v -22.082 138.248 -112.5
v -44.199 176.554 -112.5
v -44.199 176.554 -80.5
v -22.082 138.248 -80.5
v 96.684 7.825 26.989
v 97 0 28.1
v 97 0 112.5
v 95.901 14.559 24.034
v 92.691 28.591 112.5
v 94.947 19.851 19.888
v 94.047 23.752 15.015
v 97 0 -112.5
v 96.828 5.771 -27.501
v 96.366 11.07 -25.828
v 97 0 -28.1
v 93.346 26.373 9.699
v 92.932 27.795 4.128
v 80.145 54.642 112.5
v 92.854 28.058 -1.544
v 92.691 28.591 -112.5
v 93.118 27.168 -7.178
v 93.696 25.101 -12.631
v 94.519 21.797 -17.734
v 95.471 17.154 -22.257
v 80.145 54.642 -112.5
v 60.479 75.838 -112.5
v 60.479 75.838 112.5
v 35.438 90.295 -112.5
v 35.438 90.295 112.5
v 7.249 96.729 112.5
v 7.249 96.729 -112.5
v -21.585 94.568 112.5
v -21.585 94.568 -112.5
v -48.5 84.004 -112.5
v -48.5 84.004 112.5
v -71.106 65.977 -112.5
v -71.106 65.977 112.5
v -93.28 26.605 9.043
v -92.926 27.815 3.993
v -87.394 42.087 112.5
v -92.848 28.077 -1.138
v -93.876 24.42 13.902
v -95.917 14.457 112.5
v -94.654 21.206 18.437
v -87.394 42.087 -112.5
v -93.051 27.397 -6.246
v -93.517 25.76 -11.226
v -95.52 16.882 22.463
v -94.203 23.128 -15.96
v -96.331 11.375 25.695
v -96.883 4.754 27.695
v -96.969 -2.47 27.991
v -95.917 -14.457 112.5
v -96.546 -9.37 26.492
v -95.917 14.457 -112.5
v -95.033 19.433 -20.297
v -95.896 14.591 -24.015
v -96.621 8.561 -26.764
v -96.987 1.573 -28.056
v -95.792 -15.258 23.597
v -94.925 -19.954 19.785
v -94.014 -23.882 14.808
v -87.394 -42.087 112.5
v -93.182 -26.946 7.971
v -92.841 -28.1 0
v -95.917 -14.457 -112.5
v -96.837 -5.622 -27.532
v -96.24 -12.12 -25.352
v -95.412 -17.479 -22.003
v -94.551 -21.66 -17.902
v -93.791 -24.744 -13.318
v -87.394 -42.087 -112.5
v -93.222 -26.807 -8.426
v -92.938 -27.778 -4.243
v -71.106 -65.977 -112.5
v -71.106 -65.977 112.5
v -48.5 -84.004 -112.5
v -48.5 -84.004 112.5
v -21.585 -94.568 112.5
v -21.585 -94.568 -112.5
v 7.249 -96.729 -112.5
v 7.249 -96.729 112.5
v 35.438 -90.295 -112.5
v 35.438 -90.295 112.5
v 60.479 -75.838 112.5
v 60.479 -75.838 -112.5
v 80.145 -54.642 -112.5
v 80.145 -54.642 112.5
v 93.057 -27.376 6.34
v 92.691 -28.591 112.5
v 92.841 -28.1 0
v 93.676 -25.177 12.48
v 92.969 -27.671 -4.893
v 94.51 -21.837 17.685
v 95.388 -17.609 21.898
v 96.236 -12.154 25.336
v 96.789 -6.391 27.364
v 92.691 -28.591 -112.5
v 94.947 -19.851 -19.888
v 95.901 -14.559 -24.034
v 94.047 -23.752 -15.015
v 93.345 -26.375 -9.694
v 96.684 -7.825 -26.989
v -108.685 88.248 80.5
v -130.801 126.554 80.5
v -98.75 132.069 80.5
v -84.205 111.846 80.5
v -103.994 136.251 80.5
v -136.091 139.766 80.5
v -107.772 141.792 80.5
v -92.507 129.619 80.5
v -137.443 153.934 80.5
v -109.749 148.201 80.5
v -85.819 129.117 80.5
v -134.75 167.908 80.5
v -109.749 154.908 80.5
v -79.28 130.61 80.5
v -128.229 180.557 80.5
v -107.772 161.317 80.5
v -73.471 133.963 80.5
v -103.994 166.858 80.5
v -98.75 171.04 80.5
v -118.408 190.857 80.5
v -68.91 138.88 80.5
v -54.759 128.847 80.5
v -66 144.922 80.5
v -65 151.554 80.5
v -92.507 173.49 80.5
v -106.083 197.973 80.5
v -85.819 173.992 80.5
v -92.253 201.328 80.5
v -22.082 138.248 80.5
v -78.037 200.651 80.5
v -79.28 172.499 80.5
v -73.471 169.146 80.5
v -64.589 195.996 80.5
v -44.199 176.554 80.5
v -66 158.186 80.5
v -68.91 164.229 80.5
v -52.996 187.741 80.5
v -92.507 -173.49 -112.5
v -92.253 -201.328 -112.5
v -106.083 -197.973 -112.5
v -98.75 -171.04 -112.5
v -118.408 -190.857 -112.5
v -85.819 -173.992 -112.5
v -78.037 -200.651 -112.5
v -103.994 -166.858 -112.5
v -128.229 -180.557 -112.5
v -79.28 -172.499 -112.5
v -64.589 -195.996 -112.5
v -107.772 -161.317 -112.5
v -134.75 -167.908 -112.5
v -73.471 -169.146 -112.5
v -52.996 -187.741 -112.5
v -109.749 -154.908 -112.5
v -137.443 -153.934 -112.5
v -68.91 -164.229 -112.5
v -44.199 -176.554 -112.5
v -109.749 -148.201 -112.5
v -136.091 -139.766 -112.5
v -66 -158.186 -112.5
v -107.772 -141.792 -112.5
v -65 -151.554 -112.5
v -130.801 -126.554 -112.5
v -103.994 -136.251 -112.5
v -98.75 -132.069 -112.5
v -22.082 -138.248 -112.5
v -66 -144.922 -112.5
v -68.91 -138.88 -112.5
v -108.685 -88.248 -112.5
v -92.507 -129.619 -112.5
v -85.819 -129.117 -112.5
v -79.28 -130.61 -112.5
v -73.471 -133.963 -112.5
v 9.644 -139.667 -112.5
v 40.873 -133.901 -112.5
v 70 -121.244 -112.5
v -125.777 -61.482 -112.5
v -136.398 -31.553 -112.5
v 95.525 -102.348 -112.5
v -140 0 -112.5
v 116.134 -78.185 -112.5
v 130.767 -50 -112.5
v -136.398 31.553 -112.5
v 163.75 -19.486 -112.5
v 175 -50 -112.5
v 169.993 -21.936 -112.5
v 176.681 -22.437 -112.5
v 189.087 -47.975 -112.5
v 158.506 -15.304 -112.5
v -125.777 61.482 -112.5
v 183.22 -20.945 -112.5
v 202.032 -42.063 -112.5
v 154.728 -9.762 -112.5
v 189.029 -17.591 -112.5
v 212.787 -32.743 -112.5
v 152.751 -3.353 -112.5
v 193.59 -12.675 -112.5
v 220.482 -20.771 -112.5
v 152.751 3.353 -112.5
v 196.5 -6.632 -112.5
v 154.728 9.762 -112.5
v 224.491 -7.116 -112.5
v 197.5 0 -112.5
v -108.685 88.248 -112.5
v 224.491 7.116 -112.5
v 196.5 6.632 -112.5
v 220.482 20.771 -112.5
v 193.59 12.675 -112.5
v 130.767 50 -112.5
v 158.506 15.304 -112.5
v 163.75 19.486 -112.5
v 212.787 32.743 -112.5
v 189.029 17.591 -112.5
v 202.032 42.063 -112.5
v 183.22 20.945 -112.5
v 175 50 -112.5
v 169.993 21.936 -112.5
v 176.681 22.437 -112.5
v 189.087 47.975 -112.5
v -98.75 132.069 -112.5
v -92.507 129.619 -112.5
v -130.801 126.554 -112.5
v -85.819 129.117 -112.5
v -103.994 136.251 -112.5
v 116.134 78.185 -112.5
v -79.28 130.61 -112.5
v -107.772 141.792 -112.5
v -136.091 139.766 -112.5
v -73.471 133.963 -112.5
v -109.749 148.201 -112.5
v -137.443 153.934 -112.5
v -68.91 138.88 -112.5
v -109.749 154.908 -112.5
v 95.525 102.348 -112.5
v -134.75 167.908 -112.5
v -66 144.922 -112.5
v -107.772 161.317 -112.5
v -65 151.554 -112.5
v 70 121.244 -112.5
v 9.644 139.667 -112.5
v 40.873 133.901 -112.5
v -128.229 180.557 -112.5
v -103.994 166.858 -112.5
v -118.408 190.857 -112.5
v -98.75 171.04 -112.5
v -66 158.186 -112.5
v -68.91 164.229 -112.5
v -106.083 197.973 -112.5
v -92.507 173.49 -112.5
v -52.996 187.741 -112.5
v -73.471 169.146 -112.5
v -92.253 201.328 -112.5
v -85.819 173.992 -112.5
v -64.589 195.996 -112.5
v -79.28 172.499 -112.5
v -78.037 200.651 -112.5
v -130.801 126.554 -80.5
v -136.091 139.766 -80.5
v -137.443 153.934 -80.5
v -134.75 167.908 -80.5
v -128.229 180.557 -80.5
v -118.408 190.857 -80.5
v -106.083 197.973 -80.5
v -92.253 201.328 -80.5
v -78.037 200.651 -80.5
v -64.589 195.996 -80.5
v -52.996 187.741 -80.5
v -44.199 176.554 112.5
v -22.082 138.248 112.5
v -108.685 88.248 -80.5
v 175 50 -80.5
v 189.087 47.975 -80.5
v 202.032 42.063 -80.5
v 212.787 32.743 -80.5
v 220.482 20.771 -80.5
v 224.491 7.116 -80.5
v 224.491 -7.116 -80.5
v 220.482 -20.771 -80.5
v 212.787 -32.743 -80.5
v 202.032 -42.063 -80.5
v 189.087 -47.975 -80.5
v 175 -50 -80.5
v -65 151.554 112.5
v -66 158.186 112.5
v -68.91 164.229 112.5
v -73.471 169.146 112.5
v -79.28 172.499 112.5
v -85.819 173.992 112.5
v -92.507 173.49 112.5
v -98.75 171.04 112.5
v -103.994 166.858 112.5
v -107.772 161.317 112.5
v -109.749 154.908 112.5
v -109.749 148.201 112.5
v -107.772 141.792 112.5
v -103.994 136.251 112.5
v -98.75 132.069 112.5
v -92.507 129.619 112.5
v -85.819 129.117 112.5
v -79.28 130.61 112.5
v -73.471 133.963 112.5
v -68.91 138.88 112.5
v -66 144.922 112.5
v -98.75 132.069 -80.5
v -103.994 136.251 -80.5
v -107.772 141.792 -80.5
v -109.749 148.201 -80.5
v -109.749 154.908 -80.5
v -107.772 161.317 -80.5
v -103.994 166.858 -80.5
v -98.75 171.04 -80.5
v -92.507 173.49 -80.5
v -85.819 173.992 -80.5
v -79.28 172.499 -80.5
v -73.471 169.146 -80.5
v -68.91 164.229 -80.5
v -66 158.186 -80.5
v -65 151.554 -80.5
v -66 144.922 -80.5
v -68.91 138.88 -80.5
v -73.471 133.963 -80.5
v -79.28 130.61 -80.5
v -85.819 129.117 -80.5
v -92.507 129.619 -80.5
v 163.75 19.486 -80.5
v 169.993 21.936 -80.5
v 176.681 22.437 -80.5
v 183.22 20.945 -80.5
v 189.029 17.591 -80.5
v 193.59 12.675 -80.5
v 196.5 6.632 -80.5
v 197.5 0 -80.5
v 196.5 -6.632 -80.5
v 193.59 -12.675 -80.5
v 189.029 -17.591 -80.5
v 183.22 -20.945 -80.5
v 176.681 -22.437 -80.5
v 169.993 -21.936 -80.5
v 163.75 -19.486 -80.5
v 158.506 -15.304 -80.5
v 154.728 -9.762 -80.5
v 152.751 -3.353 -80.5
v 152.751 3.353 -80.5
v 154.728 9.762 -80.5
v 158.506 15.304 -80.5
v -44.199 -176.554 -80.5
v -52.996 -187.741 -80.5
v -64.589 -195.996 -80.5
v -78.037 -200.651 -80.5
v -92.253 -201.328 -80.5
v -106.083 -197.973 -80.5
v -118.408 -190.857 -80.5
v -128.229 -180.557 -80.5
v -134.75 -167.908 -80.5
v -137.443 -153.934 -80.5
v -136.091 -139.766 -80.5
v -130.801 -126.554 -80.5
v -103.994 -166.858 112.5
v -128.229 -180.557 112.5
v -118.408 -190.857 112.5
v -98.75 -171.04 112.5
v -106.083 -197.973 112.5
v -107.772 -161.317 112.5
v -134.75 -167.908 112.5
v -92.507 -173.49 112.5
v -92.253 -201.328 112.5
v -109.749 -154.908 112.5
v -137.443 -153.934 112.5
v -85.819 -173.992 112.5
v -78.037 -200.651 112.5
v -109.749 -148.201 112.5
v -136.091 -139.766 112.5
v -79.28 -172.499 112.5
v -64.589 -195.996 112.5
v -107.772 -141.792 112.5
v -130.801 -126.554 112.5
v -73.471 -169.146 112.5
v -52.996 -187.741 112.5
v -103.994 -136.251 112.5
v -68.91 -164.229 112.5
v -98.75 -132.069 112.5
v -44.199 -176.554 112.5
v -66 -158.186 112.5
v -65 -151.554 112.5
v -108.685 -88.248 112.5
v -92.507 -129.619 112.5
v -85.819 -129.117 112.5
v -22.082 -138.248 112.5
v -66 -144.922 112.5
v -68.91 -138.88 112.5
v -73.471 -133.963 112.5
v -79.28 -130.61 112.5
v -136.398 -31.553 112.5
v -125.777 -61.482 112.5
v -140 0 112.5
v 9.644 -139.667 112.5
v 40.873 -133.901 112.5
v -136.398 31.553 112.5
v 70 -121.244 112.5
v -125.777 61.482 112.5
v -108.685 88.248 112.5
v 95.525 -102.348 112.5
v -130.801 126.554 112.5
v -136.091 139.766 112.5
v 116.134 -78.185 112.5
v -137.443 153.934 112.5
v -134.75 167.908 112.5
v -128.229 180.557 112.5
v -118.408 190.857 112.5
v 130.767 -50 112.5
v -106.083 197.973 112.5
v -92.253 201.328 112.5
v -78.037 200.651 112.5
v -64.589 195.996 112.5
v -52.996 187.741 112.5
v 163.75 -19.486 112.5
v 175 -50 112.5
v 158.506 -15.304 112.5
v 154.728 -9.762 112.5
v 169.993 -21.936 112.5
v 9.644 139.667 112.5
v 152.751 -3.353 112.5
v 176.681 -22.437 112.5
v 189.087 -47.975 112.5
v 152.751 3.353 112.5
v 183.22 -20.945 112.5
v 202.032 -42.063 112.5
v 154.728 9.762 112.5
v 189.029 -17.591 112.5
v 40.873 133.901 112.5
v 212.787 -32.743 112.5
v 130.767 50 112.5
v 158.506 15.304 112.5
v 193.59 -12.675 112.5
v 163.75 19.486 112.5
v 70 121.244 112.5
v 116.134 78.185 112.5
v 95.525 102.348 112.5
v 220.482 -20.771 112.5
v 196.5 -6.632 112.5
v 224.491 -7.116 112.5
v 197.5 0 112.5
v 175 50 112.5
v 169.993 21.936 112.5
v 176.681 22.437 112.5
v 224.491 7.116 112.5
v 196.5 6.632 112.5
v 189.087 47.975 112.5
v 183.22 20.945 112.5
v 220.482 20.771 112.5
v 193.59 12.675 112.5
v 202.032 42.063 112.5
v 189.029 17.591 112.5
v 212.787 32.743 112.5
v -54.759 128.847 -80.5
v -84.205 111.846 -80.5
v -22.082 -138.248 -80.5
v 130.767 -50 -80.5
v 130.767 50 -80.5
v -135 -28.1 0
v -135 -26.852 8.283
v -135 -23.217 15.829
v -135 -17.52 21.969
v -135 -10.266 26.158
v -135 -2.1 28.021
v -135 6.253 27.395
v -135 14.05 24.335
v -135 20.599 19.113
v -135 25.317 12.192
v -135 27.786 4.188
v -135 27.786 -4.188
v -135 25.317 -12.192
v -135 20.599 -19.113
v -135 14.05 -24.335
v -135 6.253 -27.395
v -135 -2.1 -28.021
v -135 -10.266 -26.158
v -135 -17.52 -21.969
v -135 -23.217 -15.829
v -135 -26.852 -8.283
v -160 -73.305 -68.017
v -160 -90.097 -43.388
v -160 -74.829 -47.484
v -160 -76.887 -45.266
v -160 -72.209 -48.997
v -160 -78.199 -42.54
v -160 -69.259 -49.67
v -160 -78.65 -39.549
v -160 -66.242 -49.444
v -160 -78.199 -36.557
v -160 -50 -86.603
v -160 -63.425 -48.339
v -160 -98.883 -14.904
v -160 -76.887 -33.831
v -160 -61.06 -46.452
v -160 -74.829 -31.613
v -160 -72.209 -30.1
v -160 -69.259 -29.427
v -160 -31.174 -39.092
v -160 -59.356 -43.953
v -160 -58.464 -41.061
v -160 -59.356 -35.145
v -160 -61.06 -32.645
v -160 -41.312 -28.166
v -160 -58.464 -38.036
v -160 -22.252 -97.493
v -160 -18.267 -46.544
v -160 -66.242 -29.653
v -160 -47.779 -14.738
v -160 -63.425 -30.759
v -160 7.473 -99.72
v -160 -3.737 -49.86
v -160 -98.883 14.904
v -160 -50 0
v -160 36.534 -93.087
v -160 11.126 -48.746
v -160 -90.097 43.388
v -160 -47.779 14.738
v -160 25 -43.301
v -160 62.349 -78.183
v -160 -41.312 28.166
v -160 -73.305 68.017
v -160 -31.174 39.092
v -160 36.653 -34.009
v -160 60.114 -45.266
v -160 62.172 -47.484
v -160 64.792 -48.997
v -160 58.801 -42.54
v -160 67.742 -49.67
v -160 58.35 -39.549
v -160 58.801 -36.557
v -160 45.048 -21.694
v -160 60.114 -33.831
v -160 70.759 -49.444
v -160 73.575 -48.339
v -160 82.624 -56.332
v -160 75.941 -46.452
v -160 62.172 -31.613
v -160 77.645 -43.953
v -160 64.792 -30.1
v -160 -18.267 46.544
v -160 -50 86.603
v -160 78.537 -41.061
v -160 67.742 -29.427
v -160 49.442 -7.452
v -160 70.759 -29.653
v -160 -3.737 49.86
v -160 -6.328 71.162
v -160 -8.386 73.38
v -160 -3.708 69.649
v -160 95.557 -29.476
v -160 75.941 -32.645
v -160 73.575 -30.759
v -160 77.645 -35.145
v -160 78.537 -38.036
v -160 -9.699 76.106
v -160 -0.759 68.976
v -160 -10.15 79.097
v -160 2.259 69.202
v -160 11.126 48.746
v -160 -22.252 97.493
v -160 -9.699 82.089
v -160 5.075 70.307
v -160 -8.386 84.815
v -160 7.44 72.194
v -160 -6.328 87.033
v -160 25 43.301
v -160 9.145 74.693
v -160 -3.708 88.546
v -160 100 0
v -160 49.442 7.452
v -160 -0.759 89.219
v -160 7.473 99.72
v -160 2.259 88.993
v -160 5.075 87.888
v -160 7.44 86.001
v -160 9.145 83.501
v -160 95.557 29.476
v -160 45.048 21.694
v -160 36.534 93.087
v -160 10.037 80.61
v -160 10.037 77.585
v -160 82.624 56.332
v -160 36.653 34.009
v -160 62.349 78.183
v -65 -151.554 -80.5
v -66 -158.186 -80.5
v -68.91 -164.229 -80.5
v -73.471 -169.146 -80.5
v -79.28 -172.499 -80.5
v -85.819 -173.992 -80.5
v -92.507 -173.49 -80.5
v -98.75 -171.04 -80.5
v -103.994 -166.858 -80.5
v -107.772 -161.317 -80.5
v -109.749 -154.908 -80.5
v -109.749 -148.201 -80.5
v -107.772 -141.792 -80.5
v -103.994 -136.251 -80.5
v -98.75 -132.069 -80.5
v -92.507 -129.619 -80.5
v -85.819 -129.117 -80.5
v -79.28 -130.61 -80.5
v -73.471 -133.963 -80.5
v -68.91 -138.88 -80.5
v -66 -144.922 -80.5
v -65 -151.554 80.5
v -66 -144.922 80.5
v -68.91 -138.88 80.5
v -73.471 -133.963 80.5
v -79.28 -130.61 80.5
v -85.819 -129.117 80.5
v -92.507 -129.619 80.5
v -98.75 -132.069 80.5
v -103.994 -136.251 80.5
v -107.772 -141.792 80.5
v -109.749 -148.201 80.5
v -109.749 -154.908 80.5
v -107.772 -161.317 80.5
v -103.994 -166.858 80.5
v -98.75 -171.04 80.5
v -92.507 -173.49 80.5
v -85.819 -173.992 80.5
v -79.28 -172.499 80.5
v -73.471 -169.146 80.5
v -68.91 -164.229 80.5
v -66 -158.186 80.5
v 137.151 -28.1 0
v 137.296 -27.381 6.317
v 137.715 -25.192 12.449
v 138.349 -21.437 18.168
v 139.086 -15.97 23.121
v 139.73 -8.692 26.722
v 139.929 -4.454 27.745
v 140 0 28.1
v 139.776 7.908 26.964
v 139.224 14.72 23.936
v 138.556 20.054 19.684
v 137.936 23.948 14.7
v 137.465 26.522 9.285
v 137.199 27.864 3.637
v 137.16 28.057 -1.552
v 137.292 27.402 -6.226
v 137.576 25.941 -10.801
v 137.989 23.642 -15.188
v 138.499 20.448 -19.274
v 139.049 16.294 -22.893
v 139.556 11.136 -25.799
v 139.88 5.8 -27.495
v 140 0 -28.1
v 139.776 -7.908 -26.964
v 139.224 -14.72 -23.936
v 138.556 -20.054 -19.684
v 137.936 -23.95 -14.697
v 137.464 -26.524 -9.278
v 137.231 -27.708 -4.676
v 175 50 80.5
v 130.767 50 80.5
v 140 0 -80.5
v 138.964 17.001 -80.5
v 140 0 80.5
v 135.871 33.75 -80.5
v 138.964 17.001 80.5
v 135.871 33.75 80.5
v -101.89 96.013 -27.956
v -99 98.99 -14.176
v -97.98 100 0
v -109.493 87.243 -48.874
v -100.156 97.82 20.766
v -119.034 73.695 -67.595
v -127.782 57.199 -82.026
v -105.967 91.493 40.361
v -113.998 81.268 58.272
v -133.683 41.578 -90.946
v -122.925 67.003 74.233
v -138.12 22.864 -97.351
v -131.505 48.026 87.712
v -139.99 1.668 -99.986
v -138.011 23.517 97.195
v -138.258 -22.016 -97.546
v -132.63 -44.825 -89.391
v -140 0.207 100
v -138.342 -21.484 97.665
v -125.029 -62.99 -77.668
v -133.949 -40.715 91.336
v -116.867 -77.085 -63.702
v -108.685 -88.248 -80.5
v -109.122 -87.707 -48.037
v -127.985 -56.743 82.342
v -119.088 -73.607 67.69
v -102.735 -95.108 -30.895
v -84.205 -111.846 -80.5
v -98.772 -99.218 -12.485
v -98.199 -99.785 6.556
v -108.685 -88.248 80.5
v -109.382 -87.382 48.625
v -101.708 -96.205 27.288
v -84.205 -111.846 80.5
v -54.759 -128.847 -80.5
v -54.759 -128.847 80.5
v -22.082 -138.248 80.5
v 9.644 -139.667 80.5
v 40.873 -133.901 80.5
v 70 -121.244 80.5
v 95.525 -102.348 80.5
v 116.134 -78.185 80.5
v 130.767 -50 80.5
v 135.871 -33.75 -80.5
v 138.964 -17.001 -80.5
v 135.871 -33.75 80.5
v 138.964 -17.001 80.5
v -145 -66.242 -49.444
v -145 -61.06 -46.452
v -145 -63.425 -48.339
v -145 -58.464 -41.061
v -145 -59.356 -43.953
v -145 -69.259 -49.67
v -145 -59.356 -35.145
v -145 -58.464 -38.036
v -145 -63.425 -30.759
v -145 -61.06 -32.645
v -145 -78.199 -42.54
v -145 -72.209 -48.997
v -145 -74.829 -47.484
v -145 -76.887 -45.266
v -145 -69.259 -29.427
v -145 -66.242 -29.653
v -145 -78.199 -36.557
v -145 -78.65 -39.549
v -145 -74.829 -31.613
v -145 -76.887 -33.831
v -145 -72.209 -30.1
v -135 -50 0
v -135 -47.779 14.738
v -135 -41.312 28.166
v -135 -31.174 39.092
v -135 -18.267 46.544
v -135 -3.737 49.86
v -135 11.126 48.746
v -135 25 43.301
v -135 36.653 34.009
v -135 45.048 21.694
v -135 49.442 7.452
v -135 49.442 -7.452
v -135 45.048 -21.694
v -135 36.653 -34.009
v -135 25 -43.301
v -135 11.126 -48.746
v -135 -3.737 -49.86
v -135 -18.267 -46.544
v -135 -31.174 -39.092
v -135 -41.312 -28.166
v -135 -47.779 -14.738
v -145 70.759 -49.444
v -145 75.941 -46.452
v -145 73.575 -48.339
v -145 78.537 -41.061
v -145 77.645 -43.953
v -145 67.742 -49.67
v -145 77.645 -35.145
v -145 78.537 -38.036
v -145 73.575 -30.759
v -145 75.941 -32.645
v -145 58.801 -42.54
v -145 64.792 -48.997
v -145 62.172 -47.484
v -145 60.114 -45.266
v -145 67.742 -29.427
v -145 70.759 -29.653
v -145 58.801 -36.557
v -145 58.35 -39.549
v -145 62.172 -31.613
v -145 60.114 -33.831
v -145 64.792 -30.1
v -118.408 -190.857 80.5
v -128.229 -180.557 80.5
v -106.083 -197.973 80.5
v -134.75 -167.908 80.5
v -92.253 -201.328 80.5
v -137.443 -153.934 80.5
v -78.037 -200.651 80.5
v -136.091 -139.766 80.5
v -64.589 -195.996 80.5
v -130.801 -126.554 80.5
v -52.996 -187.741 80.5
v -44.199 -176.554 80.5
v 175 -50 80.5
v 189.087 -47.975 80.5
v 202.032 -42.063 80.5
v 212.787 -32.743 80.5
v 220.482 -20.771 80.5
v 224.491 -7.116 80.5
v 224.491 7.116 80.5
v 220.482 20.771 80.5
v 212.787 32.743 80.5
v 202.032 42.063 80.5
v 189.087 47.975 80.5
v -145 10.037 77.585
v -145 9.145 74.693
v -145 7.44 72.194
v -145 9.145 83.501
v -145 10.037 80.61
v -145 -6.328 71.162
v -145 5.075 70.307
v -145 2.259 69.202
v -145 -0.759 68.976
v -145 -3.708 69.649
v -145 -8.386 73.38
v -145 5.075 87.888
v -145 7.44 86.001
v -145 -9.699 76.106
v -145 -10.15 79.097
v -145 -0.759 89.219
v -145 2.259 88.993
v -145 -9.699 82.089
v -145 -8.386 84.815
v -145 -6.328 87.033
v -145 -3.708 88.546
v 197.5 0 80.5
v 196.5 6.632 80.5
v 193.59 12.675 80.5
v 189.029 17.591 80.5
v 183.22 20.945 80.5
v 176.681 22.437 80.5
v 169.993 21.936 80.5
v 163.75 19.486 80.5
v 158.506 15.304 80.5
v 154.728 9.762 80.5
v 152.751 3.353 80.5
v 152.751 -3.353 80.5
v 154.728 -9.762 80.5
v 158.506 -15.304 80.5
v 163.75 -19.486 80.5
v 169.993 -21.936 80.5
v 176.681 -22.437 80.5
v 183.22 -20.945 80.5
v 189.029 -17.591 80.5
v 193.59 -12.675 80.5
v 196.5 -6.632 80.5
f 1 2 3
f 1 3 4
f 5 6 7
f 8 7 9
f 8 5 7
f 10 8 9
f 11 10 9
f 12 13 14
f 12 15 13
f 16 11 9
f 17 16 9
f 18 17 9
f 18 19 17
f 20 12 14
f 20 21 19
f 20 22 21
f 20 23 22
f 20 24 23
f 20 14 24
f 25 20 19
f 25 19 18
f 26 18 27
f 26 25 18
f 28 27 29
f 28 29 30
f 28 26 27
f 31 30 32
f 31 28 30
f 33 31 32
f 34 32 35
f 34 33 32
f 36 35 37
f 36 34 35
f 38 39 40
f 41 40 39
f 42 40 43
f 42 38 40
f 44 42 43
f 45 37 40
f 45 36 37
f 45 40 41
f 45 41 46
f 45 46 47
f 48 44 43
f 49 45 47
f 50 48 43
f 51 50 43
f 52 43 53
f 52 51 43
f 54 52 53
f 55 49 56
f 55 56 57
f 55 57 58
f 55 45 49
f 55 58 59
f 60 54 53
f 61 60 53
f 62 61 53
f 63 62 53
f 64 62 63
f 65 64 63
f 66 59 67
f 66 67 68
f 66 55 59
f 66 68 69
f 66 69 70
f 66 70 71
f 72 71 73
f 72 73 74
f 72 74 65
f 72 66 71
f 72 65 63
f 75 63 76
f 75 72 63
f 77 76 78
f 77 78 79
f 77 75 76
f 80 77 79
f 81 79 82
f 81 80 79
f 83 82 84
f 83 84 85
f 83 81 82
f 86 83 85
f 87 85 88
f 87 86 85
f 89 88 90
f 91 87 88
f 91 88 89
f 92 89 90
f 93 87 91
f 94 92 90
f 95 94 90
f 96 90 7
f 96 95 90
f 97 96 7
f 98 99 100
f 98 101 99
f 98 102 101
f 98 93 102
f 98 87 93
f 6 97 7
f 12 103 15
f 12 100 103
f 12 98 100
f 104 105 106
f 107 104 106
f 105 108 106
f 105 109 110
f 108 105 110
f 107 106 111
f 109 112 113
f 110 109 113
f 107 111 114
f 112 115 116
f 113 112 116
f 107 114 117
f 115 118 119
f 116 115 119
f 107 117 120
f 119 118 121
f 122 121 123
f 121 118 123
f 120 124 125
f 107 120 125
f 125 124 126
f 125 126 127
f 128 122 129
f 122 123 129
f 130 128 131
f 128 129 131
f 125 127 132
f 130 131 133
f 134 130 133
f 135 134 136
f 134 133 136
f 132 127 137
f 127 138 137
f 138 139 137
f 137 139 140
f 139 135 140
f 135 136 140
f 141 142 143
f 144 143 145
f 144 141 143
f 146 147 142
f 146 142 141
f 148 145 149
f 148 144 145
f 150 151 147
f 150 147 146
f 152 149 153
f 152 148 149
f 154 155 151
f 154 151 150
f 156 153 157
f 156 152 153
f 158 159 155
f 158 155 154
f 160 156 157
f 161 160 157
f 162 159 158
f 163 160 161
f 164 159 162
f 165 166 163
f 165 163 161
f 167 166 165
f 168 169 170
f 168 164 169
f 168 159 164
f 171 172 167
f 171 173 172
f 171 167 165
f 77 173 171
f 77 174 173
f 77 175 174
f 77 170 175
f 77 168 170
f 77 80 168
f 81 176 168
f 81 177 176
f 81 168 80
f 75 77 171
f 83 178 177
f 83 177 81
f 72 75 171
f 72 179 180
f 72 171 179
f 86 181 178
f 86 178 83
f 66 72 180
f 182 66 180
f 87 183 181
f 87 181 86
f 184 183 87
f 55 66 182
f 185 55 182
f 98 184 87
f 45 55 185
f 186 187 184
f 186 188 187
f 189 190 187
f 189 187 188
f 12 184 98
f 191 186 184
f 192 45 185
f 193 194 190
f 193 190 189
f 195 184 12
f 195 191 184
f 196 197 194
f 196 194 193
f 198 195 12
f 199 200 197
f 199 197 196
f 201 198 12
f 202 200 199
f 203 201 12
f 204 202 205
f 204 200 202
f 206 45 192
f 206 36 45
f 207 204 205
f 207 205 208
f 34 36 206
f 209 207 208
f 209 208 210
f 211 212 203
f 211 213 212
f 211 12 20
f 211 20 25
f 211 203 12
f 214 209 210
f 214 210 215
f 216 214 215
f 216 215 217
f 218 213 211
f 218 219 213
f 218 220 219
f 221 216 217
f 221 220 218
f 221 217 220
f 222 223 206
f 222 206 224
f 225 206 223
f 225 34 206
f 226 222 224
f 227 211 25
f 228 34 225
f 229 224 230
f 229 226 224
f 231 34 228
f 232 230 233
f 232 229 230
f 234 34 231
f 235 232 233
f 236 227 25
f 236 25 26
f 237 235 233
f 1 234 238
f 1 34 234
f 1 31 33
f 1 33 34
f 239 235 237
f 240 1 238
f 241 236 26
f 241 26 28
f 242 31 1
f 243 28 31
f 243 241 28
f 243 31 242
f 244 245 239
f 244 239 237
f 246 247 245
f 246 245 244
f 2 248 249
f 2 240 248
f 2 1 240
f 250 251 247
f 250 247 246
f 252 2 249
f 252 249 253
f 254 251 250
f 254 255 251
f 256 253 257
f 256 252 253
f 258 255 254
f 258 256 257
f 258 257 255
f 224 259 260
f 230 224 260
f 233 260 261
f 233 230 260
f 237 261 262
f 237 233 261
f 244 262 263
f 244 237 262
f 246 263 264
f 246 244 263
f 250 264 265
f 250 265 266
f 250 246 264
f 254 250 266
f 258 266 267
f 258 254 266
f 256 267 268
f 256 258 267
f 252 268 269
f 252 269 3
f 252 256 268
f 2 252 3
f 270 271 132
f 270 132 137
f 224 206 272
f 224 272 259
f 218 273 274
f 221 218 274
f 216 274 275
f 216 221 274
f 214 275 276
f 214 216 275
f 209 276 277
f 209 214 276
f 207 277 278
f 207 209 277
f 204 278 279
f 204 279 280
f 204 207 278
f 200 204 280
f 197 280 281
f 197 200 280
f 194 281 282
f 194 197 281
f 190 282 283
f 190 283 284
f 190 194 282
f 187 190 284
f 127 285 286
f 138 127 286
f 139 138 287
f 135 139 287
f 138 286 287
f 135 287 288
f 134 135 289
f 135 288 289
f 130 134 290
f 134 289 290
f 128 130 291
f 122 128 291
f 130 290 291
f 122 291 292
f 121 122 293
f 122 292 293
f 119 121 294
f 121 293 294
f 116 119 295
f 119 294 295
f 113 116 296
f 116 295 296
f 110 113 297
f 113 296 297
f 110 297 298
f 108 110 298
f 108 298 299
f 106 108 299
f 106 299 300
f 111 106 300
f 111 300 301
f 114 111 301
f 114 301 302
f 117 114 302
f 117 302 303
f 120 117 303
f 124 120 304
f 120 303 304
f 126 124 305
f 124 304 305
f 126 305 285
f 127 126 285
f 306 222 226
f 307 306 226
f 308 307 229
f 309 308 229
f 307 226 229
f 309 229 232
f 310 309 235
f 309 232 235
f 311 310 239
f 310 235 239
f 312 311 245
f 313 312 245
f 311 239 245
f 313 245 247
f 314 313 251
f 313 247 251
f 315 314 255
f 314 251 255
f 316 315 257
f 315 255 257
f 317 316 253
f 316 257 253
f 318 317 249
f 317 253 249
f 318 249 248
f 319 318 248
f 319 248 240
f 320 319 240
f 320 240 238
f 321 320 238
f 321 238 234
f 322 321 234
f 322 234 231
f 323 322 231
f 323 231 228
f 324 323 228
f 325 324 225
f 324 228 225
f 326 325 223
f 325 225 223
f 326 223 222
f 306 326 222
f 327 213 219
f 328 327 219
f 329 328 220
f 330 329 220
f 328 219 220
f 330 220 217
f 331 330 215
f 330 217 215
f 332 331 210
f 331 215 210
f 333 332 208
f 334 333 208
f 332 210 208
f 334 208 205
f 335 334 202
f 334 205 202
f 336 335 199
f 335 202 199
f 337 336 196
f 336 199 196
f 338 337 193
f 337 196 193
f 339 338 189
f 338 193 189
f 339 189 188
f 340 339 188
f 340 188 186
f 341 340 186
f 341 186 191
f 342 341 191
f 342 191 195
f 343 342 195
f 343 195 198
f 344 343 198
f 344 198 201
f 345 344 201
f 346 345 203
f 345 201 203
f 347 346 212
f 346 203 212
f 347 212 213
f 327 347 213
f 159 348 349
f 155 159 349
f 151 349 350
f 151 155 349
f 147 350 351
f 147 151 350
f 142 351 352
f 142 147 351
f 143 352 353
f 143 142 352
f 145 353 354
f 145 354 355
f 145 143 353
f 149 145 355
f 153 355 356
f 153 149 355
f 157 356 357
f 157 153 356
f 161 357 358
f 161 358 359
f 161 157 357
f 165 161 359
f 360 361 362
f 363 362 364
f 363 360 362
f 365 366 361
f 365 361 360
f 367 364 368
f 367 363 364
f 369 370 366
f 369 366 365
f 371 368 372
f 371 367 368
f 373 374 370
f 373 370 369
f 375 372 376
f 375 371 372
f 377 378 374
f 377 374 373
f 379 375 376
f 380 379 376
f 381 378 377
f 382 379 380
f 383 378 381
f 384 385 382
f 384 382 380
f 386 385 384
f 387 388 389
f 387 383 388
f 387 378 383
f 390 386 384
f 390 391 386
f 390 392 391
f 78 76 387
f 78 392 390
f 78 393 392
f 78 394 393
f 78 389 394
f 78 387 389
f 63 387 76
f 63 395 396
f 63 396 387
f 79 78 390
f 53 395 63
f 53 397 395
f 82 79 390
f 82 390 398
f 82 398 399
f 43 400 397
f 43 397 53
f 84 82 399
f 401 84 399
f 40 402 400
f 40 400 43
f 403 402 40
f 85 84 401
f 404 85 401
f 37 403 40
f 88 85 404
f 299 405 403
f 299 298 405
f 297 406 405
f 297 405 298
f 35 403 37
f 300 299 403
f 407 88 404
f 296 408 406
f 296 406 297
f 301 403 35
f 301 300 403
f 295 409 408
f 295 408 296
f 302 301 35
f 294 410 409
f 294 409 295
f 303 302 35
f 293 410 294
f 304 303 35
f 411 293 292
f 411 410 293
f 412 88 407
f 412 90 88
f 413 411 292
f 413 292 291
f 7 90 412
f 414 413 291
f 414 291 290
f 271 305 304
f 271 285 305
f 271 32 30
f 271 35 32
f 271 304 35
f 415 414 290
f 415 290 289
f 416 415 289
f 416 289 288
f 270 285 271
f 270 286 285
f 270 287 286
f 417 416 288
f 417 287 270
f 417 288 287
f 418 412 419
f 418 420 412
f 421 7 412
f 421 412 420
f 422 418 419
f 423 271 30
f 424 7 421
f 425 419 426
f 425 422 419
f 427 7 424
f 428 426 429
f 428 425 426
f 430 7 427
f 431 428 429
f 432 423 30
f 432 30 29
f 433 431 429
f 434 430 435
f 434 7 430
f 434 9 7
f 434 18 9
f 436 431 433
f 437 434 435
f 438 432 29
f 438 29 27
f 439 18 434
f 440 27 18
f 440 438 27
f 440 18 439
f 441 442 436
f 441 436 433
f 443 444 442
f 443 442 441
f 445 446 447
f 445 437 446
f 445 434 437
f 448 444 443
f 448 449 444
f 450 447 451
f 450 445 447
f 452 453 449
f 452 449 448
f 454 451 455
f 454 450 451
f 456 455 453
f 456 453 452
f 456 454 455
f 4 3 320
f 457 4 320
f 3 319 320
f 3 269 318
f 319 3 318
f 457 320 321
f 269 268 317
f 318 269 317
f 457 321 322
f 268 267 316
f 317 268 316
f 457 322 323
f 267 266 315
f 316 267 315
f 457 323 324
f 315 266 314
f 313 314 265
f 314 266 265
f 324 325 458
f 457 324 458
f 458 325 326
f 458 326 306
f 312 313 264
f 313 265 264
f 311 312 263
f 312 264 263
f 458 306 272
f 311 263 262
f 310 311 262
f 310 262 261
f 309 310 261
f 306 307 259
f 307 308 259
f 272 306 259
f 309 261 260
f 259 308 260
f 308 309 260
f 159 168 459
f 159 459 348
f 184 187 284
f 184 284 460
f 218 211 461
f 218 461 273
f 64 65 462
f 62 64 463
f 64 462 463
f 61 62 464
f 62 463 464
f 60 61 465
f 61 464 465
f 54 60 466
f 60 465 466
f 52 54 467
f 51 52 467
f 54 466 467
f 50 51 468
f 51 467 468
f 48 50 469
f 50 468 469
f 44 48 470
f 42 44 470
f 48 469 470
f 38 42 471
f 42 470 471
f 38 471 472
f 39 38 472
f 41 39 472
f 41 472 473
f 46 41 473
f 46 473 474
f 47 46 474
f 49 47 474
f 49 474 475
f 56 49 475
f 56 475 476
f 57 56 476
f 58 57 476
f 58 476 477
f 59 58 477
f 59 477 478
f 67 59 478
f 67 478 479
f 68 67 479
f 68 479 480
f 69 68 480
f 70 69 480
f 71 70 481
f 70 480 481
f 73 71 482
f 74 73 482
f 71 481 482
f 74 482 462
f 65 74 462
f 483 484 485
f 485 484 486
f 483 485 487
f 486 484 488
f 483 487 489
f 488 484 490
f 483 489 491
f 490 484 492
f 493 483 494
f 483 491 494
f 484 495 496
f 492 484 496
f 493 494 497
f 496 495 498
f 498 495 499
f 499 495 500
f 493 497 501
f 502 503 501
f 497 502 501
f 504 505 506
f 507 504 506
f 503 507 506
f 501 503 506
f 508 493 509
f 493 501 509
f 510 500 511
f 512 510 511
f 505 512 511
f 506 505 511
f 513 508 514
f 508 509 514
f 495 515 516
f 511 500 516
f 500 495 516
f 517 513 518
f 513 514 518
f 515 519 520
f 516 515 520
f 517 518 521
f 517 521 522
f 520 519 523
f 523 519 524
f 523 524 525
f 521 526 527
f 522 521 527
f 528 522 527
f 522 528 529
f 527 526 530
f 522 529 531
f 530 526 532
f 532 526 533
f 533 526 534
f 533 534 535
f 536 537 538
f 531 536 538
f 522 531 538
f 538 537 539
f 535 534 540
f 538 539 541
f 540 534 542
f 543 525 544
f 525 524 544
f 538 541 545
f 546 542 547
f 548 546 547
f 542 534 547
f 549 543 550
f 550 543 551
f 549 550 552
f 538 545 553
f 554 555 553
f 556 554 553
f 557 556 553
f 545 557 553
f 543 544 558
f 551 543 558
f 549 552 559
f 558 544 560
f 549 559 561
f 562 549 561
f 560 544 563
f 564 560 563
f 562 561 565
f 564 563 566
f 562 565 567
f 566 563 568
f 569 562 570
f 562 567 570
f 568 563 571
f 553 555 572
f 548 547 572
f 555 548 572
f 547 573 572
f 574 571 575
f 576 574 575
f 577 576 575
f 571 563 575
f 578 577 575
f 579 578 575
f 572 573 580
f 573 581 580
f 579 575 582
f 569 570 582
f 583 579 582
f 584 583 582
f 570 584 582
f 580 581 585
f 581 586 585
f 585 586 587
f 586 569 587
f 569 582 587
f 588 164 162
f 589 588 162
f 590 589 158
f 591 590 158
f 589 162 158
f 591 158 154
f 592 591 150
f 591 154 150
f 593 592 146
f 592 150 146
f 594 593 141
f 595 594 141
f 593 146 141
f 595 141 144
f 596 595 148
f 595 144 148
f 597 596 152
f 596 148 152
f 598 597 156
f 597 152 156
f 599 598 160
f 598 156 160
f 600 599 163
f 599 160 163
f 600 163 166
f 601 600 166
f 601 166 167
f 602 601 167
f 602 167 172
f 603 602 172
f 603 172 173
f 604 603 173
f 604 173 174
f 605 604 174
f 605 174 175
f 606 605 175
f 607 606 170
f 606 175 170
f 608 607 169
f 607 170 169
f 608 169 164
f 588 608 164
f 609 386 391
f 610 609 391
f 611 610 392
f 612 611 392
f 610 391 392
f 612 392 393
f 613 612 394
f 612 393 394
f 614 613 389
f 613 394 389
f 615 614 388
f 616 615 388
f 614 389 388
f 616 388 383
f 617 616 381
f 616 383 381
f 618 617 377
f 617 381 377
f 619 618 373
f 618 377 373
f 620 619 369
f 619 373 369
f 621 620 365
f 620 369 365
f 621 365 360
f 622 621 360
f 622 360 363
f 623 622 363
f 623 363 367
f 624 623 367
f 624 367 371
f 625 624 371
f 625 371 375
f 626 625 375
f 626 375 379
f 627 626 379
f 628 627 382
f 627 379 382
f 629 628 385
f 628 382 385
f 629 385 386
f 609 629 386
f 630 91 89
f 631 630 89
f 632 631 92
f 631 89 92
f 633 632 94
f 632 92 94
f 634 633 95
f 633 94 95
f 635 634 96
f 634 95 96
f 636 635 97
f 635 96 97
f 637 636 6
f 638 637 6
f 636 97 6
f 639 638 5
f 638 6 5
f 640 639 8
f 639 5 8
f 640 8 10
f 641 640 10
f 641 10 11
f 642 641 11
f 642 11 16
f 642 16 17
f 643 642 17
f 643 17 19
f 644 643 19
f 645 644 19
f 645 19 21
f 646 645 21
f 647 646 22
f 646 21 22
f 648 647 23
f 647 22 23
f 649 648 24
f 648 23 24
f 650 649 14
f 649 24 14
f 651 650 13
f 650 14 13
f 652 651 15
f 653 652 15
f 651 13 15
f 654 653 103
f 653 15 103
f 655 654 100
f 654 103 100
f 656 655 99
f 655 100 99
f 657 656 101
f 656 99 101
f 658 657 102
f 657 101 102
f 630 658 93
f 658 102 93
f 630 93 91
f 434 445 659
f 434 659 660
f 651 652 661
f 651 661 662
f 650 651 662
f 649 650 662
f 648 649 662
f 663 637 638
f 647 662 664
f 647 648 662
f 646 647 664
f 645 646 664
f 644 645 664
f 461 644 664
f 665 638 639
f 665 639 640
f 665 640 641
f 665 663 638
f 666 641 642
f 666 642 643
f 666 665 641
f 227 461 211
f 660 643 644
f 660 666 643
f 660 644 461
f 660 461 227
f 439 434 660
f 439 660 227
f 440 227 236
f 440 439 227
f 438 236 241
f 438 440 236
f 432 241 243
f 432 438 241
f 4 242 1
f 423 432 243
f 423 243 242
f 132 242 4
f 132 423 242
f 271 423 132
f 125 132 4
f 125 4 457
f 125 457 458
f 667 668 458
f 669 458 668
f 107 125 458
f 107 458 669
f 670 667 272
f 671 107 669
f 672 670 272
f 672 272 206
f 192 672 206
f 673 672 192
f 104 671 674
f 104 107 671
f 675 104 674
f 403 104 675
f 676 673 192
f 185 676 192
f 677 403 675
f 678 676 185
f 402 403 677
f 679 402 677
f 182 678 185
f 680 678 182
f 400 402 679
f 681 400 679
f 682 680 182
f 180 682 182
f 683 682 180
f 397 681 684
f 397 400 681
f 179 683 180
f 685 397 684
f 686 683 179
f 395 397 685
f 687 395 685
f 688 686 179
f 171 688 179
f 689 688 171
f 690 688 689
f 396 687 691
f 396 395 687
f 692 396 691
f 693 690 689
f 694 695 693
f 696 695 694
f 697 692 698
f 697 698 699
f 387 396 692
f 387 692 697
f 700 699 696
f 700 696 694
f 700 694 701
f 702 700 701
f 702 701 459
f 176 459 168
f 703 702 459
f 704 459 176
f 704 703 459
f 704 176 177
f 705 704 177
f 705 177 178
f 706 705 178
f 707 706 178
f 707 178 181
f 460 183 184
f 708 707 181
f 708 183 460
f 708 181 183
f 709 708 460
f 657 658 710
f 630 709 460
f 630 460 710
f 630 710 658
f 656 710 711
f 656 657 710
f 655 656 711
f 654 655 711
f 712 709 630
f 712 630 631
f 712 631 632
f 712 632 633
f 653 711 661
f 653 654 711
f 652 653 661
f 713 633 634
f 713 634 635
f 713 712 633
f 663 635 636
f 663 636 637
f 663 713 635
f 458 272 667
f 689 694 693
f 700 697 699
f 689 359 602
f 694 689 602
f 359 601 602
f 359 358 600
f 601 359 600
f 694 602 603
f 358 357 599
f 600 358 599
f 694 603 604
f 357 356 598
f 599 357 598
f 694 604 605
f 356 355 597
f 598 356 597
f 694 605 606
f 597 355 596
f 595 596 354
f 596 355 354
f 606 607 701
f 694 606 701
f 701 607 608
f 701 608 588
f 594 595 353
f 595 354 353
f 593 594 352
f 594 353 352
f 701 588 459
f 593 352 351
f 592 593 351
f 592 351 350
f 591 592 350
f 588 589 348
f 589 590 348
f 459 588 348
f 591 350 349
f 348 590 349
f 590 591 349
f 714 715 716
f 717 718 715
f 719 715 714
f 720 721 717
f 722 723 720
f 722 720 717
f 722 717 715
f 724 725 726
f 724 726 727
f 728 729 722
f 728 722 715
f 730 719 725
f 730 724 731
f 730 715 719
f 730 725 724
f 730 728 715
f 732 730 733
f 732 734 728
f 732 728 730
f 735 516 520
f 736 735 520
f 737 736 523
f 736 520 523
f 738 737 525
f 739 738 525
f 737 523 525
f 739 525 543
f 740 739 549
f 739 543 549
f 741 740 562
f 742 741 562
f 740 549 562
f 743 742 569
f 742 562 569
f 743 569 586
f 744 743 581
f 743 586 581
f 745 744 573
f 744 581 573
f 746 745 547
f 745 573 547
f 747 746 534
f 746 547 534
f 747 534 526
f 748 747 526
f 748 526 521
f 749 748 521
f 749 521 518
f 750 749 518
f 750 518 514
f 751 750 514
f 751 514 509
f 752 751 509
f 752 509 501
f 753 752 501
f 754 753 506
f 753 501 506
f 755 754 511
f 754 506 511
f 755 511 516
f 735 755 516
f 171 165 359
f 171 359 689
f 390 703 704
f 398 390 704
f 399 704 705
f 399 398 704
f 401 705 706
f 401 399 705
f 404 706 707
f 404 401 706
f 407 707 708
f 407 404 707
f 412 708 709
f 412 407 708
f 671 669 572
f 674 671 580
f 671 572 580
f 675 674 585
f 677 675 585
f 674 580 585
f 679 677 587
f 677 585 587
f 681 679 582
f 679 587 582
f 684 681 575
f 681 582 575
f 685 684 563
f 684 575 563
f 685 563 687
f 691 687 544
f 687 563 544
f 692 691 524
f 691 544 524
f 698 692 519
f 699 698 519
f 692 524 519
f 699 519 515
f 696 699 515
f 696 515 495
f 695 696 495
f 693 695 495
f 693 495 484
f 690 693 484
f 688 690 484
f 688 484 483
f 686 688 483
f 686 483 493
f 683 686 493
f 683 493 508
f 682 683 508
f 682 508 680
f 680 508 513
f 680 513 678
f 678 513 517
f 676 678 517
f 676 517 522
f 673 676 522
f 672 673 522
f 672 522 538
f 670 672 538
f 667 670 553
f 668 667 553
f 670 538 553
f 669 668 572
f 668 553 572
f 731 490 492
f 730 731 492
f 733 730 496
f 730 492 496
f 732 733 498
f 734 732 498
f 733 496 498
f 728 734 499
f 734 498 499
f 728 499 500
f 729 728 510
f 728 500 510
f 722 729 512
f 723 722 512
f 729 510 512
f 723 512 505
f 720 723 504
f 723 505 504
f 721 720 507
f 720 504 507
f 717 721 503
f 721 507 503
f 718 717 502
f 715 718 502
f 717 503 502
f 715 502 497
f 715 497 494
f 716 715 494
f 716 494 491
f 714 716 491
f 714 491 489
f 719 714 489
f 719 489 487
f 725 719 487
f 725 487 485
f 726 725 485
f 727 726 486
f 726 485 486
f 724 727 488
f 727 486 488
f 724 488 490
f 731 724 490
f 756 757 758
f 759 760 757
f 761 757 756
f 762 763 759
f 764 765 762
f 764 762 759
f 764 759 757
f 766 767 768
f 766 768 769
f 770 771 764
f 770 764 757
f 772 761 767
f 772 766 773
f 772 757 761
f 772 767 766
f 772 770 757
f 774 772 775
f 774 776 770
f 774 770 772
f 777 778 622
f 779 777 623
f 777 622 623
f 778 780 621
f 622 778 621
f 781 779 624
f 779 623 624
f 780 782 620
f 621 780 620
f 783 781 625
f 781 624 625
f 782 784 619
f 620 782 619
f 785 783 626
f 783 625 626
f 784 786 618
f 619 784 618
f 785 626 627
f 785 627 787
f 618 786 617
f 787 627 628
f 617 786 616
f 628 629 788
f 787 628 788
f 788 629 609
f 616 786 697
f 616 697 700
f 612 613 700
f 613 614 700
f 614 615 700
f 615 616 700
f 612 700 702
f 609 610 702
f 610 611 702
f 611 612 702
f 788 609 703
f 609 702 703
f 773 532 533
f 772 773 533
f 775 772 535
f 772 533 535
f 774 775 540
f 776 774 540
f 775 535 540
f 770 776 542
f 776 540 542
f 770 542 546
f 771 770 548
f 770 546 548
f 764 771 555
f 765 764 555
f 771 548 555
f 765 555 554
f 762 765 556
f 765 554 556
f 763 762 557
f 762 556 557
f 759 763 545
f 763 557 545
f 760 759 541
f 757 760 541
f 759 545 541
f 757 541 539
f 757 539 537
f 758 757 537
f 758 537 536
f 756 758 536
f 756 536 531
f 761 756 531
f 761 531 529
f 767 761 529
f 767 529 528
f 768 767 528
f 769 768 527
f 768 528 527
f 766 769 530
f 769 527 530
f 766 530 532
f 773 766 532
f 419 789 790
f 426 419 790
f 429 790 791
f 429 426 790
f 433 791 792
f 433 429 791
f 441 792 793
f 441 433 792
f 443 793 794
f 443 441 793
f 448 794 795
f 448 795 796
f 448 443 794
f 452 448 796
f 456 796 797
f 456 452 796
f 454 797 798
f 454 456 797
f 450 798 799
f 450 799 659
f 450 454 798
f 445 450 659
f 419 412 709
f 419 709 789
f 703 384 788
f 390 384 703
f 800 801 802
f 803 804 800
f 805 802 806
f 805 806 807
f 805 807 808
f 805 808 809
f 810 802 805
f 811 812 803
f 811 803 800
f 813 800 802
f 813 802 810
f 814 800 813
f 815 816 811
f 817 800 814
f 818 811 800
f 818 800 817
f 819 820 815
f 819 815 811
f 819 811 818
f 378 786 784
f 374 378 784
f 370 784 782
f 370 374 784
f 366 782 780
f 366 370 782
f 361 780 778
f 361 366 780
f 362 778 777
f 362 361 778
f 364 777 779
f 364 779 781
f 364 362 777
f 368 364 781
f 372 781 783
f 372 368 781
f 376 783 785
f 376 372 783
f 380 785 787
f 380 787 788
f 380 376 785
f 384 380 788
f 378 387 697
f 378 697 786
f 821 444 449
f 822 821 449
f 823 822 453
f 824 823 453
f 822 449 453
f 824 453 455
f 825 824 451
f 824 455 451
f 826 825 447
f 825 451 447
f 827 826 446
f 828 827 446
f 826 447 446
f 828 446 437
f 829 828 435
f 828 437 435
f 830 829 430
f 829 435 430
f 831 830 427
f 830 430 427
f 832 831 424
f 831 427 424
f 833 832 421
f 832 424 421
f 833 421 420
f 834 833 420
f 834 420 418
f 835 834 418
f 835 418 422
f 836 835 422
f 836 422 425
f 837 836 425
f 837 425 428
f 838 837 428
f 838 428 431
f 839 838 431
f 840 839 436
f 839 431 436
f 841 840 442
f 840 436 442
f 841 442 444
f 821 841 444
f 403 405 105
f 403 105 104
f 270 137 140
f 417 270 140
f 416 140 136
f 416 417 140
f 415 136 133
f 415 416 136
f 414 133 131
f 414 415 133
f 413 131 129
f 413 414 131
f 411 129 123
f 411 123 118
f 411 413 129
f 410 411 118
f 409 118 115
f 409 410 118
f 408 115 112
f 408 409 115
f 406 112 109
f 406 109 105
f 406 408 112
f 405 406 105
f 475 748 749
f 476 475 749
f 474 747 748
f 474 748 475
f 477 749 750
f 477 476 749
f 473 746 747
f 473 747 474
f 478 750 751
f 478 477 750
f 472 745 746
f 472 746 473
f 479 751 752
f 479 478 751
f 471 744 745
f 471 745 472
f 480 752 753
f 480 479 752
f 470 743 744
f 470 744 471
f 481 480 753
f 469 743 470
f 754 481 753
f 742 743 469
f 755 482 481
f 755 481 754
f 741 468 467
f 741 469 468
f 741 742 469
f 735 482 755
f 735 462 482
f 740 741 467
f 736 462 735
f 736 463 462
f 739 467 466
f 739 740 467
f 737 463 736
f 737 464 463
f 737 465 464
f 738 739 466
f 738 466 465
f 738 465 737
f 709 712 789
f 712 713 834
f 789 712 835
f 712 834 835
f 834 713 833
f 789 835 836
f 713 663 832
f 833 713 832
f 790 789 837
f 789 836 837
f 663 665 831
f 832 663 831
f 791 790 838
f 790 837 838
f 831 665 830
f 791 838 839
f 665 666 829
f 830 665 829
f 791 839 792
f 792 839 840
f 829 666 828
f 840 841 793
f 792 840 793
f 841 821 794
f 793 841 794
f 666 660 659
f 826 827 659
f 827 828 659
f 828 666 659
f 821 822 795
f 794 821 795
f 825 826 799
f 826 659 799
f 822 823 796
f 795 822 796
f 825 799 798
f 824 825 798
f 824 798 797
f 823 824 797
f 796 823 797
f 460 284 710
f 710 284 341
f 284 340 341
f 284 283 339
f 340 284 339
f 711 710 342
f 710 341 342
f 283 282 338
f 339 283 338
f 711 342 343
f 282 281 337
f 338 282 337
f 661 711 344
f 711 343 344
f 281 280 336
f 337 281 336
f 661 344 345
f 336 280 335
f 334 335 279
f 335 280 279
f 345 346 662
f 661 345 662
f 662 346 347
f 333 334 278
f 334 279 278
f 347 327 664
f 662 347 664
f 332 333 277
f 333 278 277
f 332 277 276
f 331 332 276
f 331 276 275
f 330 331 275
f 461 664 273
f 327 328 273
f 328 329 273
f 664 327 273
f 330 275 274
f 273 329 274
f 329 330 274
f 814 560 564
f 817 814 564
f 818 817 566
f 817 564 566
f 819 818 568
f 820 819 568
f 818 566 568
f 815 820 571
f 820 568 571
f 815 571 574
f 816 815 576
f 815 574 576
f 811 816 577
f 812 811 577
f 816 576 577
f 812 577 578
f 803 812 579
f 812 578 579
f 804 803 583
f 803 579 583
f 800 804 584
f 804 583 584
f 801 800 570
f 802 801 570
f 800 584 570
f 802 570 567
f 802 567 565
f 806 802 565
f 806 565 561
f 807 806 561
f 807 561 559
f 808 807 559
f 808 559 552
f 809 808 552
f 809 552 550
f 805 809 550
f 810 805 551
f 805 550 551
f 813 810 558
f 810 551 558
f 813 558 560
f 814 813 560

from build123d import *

# Parameters (mm, degrees)
F0_R            = 140
F0_R_2          = 97
F1_DEPTH        = 112.5
F2_R            = 22.5
F3_DEPTH        = 32
F3_COPIES_COUNT = 3
F5_R            = 100
F7_R            = 28.1
F8_DEPTH        = 310
F9_R            = 50
F9_R_2          = 28.1
F10_DEPTH       = 25
F11_R           = 10.15
F12_DEPTH       = 15
F14_R           = 22.5
F14_R_2         = 97
F15_DEPTH       = 32


# Not quite as in the source:
# - a pattern or mirror of a feature is missing from the dataset's text; its kind, count and spacing are read off the source's solid
# - a feature names something its author has since deleted; it is built from what else it names


with BuildPart() as f1:
    # F0 (on Top) → F1 (new body, symmetric)
    with BuildSketch(Plane.XY):
        Circle(F0_R)
        Circle(F0_R_2, mode=Mode.SUBTRACT)
    extrude(amount=F1_DEPTH, both=True)

    # F2 (on face) → F3 (join)
    with BuildSketch(Plane(origin=(0, 0, -112.5), x_dir=(1, 0, 0), z_dir=(0, 0, -1))):
        with BuildLine():
            ThreePointArc((-44.1987298108, 176.5544456623), (-112.5, 194.8557158515), (-130.8012701892, 126.5544456623))
            Line((-130.8012701892, 126.5544456623), (-108.6847543423, 88.2475165291))
            ThreePointArc((-108.6847543423, 88.2475165291), (-70, 121.2435565298), (-22.0822139639, 138.2475165291))
            Line((-22.0822139639, 138.2475165291), (-44.1987298108, 176.5544456623))
        make_face()
        with Locations((-87.5, 151.5544456623)):
            Circle(F2_R, mode=Mode.SUBTRACT)
    f3 = extrude(amount=-F3_DEPTH)

    # F3_copies: F3 ×3 about axis
    f3_copies_axis = Axis((0, 0, 0), (0, 0, 1))
    for i in range(1, F3_COPIES_COUNT):
        add(f3.rotate(f3_copies_axis, i * 360 / F3_COPIES_COUNT))

    # F5 (on offset) → F6 (join, up to the next surface of F1)
    with BuildSketch(Plane.YZ.offset(-160)):
        Circle(F5_R)
    extrude(until=Until.NEXT)

    # F7 (on face) → F8 (cut)
    with BuildSketch(Plane(origin=(-160, 0, 0), x_dir=(0, -1, 0), z_dir=(-1, 0, 0))):
        Circle(F7_R)
    extrude(amount=-F8_DEPTH, mode=Mode.SUBTRACT)

    # F9 (on face) → F10 (cut)
    with BuildSketch(Plane(origin=(-160, 0, 0), x_dir=(0, -1, 0), z_dir=(-1, 0, 0))):
        Circle(F9_R)
        Circle(F9_R_2, mode=Mode.SUBTRACT)
    extrude(amount=-F10_DEPTH, mode=Mode.SUBTRACT)

    # F11 (on face) → F12 (cut)
    with BuildSketch(Plane(origin=(-160, 0, 0), x_dir=(0, -1, 0), z_dir=(-1, 0, 0))):
        with Locations((0, 79.0973976254)):
            Circle(F11_R)
        with Locations((-68.5003557169, -39.5486988127)):
            Circle(F11_R)
        with Locations((68.5003557169, -39.5486988127)):
            Circle(F11_R)
    extrude(amount=-F12_DEPTH, mode=Mode.SUBTRACT)

    # F14 (on face) → F15 (join)
    with BuildSketch(Plane.XY.offset(112.5)):
        with BuildLine():
            Line((-130.8012701892, 126.5544456623), (-108.6847543423, 88.2475165291))
            ThreePointArc((-108.6847543423, 88.2475165291), (-70, 121.2435565298), (-22.0822139639, 138.2475165291))
            Line((-22.0822139639, 138.2475165291), (-44.1987298108, 176.5544456623))
            ThreePointArc((-44.1987298108, 176.5544456623), (-112.5, 194.8557158515), (-130.8012701892, 126.5544456623))
        make_face()
        with Locations((-87.5, 151.5544456623)):
            Circle(F14_R, mode=Mode.SUBTRACT)
        with BuildLine():
            ThreePointArc((-22.0822139639, 138.2475165291), (-70, 121.2435565298), (-108.6847543423, 88.2475165291))
            ThreePointArc((-108.6847543423, 88.2475165291), (-140, 0), (-108.6847543423, -88.2475165291))
            ThreePointArc((-108.6847543423, -88.2475165291), (-70, -121.2435565298), (-22.0822139639, -138.2475165291))
            ThreePointArc((-22.0822139639, -138.2475165291), (70, -121.2435565298), (130.7669683062, -50))
            ThreePointArc((130.7669683062, -50), (137.6723929531, -25.4226713499), (140, 0))
            ThreePointArc((140, 0), (137.6723929531, 25.4226713499), (130.7669683062, 50))
            ThreePointArc((130.7669683062, 50), (70, 121.2435565298), (-22.0822139639, 138.2475165291))
        make_face()
        Circle(F14_R_2, mode=Mode.SUBTRACT)
        with BuildLine():
            ThreePointArc((-22.0822139639, -138.2475165291), (-70, -121.2435565298), (-108.6847543423, -88.2475165291))
            Line((-108.6847543423, -88.2475165291), (-130.8012701892, -126.5544456623))
            ThreePointArc((-130.8012701892, -126.5544456623), (-112.5, -194.8557158515), (-44.1987298108, -176.5544456623))
            Line((-44.1987298108, -176.5544456623), (-22.0822139639, -138.2475165291))
        make_face()
        with Locations((-87.5, -151.5544456623)):
            Circle(F14_R, mode=Mode.SUBTRACT)
        with BuildLine():
            Line((175, 50), (130.7669683062, 50))
            ThreePointArc((130.7669683062, 50), (137.6723929531, 25.4226713499), (140, 0))
            ThreePointArc((140, 0), (137.6723929531, -25.4226713499), (130.7669683062, -50))
            Line((130.7669683062, -50), (175, -50))
            ThreePointArc((175, -50), (225, 0), (175, 50))
        make_face()
        with Locations((175, 0)):
            Circle(F14_R, mode=Mode.SUBTRACT)
    extrude(amount=-F15_DEPTH)


solid = f1.part
